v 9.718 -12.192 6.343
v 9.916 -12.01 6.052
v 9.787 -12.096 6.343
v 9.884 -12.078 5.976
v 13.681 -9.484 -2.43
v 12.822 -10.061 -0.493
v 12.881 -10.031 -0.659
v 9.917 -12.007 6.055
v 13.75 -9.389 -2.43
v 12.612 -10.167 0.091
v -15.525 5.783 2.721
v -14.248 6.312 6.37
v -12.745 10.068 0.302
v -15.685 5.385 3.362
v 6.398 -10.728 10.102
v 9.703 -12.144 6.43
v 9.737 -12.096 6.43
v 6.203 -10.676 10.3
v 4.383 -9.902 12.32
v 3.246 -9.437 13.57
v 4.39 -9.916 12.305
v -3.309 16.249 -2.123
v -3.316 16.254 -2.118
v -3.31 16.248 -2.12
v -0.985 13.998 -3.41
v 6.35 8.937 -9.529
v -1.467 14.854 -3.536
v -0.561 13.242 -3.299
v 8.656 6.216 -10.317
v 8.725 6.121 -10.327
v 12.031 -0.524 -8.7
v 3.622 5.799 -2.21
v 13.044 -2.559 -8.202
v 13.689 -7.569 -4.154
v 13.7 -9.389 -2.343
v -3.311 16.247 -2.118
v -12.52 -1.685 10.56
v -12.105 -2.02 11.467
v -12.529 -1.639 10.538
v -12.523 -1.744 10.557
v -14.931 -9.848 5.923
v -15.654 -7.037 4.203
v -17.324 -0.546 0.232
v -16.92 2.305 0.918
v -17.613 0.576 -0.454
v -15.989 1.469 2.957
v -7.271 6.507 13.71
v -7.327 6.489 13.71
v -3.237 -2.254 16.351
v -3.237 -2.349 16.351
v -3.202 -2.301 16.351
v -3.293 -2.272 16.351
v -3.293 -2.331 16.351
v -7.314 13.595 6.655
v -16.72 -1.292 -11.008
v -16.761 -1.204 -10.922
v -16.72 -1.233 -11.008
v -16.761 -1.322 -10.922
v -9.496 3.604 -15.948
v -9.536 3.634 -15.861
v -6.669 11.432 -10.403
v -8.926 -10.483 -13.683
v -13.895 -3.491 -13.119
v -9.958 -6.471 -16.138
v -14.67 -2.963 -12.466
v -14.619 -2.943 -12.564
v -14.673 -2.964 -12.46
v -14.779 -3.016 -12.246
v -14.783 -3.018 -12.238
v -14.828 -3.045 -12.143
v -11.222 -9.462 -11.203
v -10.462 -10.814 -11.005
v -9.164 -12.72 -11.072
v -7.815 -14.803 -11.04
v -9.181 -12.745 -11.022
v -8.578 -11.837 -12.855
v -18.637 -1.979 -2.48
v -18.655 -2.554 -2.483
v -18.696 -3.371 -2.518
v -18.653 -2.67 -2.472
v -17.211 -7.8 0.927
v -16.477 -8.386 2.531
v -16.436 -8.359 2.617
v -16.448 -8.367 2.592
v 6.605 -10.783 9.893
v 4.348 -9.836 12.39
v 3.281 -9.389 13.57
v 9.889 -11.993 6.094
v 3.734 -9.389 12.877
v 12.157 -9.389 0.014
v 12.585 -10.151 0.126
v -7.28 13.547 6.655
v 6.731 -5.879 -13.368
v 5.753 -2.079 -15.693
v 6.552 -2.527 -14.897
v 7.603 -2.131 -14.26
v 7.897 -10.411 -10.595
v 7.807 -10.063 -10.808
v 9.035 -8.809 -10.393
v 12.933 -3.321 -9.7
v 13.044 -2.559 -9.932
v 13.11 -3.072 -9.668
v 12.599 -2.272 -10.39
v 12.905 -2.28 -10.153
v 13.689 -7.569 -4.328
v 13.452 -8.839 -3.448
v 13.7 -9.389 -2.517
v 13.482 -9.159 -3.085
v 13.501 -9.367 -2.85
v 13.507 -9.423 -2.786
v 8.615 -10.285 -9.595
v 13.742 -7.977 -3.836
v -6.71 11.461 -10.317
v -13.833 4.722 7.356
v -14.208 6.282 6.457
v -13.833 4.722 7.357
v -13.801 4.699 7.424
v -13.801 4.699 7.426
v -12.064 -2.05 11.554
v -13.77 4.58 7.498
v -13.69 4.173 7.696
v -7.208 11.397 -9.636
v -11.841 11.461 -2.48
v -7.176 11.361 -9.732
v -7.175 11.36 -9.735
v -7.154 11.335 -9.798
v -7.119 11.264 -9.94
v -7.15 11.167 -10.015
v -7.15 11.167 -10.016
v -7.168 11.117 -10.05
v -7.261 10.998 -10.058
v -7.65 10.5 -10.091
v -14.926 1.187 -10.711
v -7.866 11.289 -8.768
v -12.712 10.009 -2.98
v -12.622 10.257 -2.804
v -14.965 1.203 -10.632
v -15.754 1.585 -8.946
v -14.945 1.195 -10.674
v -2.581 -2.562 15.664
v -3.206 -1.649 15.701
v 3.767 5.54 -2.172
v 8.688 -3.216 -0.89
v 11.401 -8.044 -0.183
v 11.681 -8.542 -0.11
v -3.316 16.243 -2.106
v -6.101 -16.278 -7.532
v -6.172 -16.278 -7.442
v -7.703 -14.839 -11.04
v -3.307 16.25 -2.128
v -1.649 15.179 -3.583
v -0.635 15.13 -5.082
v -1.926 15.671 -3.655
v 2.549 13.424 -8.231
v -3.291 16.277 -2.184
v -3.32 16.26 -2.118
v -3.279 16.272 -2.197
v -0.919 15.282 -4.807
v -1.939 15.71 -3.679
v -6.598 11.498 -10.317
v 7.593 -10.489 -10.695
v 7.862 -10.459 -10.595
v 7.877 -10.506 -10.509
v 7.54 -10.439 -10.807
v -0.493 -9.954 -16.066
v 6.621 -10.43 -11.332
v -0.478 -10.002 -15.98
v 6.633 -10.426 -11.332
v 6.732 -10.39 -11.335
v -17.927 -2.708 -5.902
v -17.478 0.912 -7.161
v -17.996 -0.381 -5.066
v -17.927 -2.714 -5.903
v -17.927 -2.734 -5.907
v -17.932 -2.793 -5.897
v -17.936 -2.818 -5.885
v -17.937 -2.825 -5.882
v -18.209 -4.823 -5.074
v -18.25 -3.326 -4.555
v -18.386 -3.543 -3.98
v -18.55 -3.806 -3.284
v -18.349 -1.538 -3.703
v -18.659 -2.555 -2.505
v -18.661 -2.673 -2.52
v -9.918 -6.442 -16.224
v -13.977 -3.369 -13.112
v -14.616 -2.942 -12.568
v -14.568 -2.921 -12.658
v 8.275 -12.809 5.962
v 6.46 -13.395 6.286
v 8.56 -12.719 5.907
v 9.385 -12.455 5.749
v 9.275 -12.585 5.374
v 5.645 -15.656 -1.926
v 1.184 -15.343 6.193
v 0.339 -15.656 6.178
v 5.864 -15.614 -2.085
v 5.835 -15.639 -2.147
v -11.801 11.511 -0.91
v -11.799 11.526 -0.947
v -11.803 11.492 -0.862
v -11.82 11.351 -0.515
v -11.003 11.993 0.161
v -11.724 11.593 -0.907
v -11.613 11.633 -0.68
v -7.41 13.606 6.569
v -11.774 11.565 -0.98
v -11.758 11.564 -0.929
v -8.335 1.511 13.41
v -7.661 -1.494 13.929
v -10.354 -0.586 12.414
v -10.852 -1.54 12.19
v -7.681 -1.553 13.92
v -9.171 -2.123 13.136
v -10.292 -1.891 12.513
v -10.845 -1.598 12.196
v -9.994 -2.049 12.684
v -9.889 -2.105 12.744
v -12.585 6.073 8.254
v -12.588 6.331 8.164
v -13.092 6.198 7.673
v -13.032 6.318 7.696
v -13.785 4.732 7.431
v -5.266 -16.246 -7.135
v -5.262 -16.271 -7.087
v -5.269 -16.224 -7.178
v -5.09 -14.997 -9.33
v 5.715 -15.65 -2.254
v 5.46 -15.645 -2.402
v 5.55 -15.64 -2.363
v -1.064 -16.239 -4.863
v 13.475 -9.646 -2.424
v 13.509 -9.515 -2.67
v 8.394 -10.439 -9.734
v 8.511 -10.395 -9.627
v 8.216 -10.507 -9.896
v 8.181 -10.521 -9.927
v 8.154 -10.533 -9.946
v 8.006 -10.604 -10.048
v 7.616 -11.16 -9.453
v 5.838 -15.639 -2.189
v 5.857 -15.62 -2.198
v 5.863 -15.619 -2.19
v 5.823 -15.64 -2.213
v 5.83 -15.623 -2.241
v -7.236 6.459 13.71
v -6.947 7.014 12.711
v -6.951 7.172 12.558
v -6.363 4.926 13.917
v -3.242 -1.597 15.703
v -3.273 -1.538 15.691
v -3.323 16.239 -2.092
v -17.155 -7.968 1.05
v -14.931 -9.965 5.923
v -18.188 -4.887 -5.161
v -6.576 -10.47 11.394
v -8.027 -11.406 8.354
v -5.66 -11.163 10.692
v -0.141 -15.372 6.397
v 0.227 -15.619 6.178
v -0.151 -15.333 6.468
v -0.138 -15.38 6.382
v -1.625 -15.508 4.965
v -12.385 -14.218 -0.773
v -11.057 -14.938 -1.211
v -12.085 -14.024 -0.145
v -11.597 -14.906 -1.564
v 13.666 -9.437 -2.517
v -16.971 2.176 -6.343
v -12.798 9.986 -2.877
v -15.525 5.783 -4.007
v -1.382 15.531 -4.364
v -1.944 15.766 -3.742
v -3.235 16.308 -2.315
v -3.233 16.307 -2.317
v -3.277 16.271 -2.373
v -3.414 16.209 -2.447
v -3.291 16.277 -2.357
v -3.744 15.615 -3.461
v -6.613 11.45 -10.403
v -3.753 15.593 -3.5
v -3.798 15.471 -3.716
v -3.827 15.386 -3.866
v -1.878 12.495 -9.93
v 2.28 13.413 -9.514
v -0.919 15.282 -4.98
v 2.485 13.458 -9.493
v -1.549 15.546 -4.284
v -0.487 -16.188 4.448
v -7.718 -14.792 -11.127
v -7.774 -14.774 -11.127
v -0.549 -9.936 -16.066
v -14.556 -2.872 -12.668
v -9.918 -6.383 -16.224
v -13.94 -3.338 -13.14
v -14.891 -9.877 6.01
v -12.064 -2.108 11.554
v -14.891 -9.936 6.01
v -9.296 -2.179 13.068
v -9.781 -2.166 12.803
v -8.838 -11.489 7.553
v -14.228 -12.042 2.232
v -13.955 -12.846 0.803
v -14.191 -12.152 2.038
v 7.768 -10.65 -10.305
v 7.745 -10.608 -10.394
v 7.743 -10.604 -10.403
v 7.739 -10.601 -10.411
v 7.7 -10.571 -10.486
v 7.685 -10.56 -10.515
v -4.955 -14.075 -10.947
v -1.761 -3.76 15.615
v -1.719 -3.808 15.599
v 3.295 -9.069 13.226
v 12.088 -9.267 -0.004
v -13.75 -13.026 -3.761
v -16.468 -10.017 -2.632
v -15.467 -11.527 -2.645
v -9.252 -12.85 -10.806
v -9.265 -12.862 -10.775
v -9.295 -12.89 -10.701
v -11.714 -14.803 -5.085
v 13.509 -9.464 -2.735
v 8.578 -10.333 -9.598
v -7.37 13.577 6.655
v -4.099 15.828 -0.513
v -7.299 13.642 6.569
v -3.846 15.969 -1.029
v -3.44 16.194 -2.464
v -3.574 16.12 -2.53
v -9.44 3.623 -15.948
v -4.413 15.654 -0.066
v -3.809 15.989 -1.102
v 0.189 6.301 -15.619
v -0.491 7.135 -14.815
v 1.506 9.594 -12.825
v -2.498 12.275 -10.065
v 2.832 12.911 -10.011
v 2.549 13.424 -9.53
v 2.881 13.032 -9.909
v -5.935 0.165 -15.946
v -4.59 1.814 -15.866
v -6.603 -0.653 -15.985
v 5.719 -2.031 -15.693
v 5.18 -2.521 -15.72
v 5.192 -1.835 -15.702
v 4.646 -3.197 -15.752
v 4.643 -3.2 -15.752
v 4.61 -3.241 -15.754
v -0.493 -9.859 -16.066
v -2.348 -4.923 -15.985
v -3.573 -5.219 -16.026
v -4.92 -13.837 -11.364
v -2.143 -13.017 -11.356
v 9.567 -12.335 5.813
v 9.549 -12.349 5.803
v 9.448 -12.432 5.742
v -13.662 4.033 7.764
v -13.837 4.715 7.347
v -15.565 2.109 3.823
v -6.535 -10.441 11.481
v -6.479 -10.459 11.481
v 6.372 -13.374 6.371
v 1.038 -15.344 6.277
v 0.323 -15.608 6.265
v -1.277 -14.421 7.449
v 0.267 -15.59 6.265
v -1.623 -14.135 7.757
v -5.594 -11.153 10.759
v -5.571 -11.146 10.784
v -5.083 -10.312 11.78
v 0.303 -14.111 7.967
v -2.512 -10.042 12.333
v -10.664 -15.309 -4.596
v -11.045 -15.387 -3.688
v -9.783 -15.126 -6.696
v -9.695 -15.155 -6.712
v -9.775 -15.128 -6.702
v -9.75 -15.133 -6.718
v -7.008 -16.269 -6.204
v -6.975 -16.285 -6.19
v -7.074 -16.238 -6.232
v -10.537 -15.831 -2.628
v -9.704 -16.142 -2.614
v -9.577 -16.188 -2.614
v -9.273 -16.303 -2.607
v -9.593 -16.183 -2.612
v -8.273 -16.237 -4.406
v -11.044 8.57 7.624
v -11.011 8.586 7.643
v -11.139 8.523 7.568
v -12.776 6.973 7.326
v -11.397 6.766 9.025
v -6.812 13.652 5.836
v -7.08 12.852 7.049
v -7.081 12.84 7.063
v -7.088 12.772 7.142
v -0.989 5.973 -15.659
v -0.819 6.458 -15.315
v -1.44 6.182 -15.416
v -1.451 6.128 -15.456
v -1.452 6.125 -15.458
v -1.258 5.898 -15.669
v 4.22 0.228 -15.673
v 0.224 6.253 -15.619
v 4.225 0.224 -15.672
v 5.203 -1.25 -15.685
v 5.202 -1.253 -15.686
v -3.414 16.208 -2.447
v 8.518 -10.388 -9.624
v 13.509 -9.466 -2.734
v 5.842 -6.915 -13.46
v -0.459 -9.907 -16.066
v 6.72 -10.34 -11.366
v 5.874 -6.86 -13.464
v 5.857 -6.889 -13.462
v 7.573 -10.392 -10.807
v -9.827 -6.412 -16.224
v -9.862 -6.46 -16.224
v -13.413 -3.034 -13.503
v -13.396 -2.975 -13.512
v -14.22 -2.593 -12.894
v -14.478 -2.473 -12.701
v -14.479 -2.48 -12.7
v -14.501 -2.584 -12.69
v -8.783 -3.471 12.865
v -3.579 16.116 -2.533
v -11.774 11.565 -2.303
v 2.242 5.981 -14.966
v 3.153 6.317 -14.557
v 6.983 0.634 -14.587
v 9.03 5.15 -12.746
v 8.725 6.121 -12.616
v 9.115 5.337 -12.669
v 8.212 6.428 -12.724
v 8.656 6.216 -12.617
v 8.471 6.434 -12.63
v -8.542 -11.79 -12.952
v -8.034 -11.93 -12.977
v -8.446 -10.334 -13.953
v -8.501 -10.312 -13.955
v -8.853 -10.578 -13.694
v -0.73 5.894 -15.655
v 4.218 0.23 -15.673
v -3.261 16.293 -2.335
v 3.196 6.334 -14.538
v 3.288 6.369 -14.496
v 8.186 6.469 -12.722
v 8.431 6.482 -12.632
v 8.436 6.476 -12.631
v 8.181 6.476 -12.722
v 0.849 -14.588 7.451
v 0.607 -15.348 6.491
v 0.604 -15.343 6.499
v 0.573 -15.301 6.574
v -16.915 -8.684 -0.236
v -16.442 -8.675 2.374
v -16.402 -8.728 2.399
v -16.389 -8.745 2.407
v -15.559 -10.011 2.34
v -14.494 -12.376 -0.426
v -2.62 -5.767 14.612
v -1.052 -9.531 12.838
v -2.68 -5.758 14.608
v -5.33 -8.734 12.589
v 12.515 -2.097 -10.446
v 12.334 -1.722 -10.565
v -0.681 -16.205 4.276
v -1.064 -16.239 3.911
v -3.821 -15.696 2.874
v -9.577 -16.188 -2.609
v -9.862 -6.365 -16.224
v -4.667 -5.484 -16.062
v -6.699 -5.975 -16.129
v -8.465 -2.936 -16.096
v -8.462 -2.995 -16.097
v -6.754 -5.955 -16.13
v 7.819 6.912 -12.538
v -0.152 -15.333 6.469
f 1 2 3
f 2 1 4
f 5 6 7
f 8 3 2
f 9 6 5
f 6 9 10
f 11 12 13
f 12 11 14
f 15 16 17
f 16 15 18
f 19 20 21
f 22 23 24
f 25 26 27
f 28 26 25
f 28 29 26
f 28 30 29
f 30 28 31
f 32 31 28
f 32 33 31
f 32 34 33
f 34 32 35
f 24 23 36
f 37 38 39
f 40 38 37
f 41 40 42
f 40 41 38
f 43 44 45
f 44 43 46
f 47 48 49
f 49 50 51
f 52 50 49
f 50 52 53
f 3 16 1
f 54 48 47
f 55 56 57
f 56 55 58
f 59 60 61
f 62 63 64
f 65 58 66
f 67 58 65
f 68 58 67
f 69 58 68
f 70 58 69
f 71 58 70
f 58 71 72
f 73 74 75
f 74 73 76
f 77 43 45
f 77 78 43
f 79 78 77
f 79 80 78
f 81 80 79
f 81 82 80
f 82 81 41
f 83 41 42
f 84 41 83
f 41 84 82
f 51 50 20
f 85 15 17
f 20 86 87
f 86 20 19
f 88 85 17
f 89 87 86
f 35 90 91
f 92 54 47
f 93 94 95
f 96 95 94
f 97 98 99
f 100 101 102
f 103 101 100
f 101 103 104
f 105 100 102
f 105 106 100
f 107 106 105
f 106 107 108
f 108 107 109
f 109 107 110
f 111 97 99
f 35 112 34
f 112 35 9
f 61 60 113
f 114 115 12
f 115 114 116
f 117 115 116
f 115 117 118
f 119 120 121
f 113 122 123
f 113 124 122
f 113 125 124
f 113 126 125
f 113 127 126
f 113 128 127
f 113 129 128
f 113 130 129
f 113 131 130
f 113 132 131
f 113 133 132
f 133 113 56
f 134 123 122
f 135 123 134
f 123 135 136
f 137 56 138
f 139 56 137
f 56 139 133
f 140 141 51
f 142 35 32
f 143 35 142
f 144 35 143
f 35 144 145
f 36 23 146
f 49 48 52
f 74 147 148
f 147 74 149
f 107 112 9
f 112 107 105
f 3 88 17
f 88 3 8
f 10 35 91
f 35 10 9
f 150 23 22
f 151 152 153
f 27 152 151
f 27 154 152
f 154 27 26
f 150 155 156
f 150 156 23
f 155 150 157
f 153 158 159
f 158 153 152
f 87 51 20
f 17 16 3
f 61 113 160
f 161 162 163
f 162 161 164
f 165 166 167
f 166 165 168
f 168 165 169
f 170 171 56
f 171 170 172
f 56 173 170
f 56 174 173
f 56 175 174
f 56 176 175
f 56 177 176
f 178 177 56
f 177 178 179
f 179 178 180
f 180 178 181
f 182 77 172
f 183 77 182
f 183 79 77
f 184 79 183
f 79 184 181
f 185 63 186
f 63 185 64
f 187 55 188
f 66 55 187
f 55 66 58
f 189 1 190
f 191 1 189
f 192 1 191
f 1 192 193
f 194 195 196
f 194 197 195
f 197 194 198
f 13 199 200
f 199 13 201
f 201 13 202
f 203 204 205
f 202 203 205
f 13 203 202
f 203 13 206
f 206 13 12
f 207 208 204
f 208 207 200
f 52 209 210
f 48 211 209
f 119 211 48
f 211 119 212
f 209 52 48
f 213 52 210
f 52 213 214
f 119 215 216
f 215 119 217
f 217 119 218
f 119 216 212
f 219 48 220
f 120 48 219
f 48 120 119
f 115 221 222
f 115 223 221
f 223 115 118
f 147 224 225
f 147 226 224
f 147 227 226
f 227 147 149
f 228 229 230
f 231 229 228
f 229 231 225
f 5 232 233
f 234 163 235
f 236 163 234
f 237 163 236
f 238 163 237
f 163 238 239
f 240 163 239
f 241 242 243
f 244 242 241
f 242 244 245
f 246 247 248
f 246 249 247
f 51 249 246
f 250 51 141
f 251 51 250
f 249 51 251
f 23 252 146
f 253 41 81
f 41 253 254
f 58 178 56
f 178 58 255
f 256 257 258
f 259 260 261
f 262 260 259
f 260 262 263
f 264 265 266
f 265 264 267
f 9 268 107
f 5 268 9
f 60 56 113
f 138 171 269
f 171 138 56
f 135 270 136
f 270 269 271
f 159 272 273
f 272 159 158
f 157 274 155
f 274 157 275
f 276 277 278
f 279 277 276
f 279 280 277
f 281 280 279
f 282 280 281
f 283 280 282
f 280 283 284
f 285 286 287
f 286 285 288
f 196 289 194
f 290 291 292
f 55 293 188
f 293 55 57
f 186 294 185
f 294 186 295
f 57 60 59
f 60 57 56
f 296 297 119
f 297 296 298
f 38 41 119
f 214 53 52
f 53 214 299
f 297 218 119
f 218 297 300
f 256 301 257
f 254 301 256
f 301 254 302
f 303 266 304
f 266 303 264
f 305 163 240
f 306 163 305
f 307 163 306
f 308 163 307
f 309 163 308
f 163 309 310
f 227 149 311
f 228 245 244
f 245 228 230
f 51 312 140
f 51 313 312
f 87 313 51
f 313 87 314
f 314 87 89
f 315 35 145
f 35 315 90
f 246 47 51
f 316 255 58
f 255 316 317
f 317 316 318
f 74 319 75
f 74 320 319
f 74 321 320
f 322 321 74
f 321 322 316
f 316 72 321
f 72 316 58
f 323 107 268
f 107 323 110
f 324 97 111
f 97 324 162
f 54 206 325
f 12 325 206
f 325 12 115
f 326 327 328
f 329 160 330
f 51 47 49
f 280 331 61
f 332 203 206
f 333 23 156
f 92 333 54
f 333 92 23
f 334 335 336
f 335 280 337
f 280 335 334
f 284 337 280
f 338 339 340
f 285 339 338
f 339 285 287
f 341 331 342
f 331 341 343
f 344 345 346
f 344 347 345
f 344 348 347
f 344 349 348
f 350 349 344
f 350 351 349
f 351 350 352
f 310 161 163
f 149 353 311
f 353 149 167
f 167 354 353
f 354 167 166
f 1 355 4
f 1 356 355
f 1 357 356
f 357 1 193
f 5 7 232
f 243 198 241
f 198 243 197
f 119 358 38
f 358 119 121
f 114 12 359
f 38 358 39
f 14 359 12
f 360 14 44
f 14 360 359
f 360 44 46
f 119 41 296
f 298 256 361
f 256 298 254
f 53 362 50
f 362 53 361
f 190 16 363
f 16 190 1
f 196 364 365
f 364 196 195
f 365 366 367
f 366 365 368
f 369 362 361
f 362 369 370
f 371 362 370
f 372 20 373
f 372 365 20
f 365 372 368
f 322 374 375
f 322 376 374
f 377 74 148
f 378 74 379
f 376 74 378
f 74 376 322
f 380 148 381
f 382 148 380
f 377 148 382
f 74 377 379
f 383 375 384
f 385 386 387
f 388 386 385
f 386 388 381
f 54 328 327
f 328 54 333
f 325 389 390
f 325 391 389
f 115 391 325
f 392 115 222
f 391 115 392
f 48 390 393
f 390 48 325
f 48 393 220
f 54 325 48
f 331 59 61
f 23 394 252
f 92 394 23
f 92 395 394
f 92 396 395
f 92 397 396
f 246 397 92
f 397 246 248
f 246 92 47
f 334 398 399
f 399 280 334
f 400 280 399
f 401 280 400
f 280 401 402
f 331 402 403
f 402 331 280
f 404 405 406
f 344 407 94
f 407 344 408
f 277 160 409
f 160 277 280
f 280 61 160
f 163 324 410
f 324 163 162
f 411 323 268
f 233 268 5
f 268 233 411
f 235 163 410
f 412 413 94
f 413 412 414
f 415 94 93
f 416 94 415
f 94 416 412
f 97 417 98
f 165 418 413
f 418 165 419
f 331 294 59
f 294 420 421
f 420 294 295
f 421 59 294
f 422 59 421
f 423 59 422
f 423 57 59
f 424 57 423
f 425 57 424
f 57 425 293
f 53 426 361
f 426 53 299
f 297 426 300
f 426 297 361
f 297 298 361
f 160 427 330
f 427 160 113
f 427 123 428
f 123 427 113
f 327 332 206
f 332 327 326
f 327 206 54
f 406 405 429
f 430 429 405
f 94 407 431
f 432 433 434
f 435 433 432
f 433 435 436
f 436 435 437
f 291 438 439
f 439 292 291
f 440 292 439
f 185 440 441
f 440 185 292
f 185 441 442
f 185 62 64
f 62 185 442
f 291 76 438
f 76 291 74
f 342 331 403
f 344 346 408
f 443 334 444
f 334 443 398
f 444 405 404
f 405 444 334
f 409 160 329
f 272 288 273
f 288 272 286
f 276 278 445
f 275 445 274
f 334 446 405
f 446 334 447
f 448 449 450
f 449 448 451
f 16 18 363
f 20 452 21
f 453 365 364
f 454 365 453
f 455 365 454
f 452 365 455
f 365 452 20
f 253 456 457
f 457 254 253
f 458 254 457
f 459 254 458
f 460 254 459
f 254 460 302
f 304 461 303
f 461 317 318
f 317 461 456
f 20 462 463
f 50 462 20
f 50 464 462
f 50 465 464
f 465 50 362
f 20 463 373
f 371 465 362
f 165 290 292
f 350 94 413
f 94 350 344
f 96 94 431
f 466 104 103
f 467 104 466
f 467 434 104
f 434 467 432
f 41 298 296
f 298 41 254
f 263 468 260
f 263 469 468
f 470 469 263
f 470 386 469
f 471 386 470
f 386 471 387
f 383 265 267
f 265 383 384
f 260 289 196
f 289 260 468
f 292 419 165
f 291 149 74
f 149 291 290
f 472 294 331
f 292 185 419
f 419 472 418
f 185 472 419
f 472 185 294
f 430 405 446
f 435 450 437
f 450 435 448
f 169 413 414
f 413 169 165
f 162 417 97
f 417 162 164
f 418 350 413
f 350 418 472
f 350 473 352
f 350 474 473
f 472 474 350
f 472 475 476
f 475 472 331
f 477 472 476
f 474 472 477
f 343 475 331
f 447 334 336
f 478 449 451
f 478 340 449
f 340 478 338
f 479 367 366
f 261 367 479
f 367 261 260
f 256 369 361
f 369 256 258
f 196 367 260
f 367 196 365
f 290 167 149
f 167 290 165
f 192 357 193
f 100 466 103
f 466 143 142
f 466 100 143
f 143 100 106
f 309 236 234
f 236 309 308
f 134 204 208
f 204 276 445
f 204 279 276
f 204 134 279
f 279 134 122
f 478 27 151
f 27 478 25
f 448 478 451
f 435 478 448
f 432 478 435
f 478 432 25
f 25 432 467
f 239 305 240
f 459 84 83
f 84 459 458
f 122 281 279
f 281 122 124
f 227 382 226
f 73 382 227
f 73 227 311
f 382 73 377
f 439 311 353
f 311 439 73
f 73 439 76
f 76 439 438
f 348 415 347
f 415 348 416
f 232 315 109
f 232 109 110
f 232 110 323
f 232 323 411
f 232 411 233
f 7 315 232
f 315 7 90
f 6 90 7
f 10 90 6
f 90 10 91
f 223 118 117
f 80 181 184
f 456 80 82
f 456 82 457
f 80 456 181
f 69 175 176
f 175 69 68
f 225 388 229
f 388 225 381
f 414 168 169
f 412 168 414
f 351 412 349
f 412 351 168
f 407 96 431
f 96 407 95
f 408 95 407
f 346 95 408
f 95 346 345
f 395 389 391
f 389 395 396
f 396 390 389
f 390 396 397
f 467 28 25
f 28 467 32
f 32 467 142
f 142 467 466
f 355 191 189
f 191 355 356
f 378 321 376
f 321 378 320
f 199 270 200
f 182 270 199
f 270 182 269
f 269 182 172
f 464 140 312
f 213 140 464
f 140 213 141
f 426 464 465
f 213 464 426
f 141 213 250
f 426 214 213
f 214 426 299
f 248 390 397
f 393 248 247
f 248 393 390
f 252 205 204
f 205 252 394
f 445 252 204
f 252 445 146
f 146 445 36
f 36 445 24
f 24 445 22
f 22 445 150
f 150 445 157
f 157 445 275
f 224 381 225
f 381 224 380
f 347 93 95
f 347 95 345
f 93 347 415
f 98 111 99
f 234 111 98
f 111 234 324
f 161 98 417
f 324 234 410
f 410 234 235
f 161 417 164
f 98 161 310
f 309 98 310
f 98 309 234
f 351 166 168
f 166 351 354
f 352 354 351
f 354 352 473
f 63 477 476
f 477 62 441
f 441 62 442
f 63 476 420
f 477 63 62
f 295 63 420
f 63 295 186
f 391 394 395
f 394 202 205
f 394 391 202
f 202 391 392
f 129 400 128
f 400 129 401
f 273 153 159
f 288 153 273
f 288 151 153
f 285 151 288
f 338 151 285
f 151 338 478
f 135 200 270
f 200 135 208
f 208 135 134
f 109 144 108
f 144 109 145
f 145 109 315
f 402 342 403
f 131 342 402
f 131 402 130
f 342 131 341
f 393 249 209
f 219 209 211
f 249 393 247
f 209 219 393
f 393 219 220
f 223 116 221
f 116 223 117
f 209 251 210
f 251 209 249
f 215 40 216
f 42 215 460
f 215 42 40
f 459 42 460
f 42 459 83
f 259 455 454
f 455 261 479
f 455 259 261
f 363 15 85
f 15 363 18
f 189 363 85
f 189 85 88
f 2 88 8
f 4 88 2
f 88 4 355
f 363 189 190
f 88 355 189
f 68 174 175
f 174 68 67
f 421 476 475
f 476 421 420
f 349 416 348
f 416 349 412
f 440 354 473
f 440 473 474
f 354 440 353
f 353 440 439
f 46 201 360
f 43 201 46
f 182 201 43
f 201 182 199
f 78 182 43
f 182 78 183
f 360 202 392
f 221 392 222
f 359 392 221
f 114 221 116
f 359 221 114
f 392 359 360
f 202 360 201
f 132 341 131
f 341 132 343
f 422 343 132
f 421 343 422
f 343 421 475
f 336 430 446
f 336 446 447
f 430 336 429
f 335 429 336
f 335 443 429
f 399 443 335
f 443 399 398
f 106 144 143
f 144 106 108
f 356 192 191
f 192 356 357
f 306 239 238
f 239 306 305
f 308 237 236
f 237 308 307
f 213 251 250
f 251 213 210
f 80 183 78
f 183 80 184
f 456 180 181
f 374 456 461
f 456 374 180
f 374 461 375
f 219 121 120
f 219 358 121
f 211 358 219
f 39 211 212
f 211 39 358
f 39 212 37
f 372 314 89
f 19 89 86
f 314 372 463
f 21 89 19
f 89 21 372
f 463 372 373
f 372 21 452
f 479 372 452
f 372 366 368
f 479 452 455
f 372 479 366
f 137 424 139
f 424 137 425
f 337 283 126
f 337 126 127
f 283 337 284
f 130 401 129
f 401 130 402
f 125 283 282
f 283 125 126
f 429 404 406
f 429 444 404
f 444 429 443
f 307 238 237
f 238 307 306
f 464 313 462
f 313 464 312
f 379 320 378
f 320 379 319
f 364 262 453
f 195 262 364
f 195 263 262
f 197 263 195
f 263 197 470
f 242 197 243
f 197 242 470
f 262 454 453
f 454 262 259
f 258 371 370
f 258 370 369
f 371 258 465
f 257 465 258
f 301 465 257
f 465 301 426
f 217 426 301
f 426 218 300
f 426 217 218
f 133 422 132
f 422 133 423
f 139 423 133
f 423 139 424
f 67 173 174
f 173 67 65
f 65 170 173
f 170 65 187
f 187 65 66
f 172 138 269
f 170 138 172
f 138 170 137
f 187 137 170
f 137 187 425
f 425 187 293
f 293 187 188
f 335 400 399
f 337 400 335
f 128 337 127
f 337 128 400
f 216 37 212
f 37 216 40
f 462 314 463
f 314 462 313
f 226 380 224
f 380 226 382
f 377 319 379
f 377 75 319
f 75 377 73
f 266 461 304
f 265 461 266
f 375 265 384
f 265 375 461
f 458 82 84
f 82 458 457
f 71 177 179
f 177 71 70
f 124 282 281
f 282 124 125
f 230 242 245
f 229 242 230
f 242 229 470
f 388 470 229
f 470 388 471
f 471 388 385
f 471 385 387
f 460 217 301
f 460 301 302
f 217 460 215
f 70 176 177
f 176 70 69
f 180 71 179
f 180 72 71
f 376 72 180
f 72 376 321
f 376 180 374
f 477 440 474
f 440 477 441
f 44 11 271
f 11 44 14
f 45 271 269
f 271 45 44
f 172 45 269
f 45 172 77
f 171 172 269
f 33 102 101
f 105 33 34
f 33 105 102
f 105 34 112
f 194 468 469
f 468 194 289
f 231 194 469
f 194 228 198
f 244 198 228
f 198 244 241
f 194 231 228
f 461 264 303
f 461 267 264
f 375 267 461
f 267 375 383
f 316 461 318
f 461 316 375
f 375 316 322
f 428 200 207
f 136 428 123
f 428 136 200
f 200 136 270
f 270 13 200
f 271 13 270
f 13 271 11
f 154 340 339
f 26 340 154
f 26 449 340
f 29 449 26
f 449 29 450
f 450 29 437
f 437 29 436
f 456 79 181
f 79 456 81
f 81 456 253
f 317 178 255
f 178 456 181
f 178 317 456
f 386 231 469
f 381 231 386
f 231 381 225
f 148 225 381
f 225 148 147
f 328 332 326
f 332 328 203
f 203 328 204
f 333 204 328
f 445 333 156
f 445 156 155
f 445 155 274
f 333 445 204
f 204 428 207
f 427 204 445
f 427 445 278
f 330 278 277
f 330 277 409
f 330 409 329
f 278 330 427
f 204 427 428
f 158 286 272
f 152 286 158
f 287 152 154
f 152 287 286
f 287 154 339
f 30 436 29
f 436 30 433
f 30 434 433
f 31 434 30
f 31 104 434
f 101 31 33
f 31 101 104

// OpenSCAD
// Auto-generated OpenSCAD file

    inner_points = 10*[[-0.45355703407615483, -0.9852604747027949, 1.2442629448836795], [-0.11128666904117222, 0.5835651383085163, -1.565322994036517], [-1.0016741042155215, -0.15000111337832142, 1.287960504788888], [0.1599278591139769, -1.520900805152802, 0.6639822178016064], [-0.7247715622313039, 1.119205468758524, -0.9850422669544439], [0.43683040109819454, -0.25169422301595684, -1.6090205539417255], [-1.2750612603248952, 0.6658365922161982, 0.7783839148588771], [0.604450197740842, -1.5523257042416663, -0.23123416172848094], [-1.1692939008581689, 1.150630367847388, -0.08982588742435665], [0.7102175572075684, -1.0675319286104765, -1.0994439640117146], [-0.07373926097703089, -0.15917918368749281, 1.6605899316050716], [0.5369510310439554, -0.879903803247868, 1.3325451328490563], [0.25177920002421017, 1.3328626384976536, -1.0114850836962188], [0.8624694920451964, 0.6121380189372783, -1.3395298824522341], [-0.5056295914533497, 0.708853913520469, 1.415662831037149], [1.0931783496571914, -1.1780276370174307, 0.5568303980612812], [-0.3044481185890256, 1.6309864722672165, -0.23577034890844362], [1.2943598225215154, -0.2558950782706834, -1.0946027818843114], [-0.5937525335554718, 1.3926363486024174, 0.691317658796271], [1.3824827646236373, -0.9396775133526316, -0.3702576096434335], [-0.8286998825229884, -1.5635001676990283, 0.5197584930665651], [-0.5517973405387707, -0.2942935855621831, -1.7532442786767668], [-1.715571931822494, -0.2120221316545012, 0.5904626302186273], [-1.5444367493050026, 0.5723906748511545, -0.8143303392414709], [-0.10944762986613042, -1.614346722517846, -0.9287320362987417], [-1.608667983638949, -1.0856125902905323, 0.11568767674818647], [-1.4375328011214579, -0.30119978378487644, -1.2891052927119118], [-0.9951830904488174, -1.6212529207405393, -0.4645930503338865], [-0.889415730982091, -1.1364591451093493, -1.3328028526171203], [-1.8820551397483227, -0.2697748846960123, -0.39388891318182445]];

    outer_points = 10*[[-1.2023976649193235, -0.20790108708079238, 1.1467271385135702], [0.5703055554767221, -0.20790108708079238, -1.5606072049684219], [-1.4167473948229383, 0.6253103044559617, 0.6370086178537524], [-0.649491745903262, -1.0411124786175465, 1.139390809023269], [0.01739963646066056, 0.6253103044559617, -1.5532708754781206], [0.7846552853803369, -1.0411124786175465, -1.050888684308604], [-1.210666624270285, 1.1402632642392723, -0.19506960275945007], [0.0307790937421078, -1.5560654384008572, 0.6178018578954751], [-0.662871203184709, 1.1402632642392723, -1.0316819243503268], [0.5785745148276837, -1.5560654384008572, -0.21881046369540158], [-0.7286095026793453, 0.645946238583741, 1.3622950437703323], [-0.32523933709311637, -0.2301440644221562, 1.6264129918427295], [0.9573314465357177, 0.645946238583741, -1.2125329253878778], [1.3607016121219466, -0.2301440644221562, -0.9484149773154806], [-0.7329567518749942, 1.354718182322609, 0.6568707507430379], [0.32308005167742637, -0.9389160081610243, 1.3483405158354533], [0.30901205776517493, 1.354718182322609, -0.9344604493806018], [1.3650488613175955, -0.9389160081610243, -0.24299068428818626], [-0.336620583244891, 1.6254449745585284, -0.22041178379259257], [0.9687126926874923, -1.2096428003969435, 0.6342918502474442], [-1.4850387512679277, -0.9906633299119916, 0.5922929336654642], [-0.05089171998432884, -0.9906633299119916, -1.597986559666409], [-1.8318638997313361, 0.35750102140807305, -0.23244895745743688], [-0.9455122895333135, 0.35750102140807305, -1.586116129198433], [-0.3843374111662901, -1.8238747214487456, -0.2516557174157139], [-1.874070279152174, -0.6412256095550173, -0.26008477011600517], [-0.9877186689541513, -0.6412256095550173, -1.6137519418570012], [-1.3211643601361125, -1.4744370010917713, -0.26742109960630656], [-0.7733689390505365, -1.4744370010917713, -1.1040334211971832], [-1.6679895085995209, -0.12627264977170682, -1.0921629907292074]];

    // Convex hull for inner set (I)
    module inner_hull() {
        hull() {
            for (p = inner_points) {
                translate(p) sphere(r=0.1);
            }
        }
    }

    // Convex hull for outer set (O) minus inner hull (O \ I)
    module outer_minus_inner() {
        difference() {
            hull() {
                for (p = outer_points) {
                    translate(p) sphere(r=0.1);
                }
            }
            inner_hull(); // Subtract inner hull
        }
    }

    // Convex hull for outer set (O) minus all translated inner hulls
    module outer_minus_AllTranslationInner() {
        difference() {
            hull() {
                for (p = outer_points) {
                    translate(p) sphere(r=0.1);
                }
            }
            hull() {
                translate([0,0,50]) inner_hull();
                translate([0,0,-50]) inner_hull();
            }; // Subtract translated inner hulls
        }
    }

    // Difference between outer_minus_inner and outer_minus_AllTranslationInner
    module outer_minus_inner_diff() {
        difference() {
            // Outer minus inner
            difference() {
                hull() {
                    for (p = outer_points) {
                        translate(p) sphere(r=0.1);
                    }
                }
                inner_hull();
            }

            // Subtract Outer minus AllTranslationInner
            difference() {
                hull() {
                    for (p = outer_points) {
                        translate(p) sphere(r=0.1);
                    }
                }
                hull() {
                    translate([0,0,50]) inner_hull();
                    translate([0,0,-50]) inner_hull();
                };
            }
        }
    }

    // Rendering all with colors applied
    color([1, 1, 0, 1]) outer_minus_inner_diff(); // Opaque yellow
    
